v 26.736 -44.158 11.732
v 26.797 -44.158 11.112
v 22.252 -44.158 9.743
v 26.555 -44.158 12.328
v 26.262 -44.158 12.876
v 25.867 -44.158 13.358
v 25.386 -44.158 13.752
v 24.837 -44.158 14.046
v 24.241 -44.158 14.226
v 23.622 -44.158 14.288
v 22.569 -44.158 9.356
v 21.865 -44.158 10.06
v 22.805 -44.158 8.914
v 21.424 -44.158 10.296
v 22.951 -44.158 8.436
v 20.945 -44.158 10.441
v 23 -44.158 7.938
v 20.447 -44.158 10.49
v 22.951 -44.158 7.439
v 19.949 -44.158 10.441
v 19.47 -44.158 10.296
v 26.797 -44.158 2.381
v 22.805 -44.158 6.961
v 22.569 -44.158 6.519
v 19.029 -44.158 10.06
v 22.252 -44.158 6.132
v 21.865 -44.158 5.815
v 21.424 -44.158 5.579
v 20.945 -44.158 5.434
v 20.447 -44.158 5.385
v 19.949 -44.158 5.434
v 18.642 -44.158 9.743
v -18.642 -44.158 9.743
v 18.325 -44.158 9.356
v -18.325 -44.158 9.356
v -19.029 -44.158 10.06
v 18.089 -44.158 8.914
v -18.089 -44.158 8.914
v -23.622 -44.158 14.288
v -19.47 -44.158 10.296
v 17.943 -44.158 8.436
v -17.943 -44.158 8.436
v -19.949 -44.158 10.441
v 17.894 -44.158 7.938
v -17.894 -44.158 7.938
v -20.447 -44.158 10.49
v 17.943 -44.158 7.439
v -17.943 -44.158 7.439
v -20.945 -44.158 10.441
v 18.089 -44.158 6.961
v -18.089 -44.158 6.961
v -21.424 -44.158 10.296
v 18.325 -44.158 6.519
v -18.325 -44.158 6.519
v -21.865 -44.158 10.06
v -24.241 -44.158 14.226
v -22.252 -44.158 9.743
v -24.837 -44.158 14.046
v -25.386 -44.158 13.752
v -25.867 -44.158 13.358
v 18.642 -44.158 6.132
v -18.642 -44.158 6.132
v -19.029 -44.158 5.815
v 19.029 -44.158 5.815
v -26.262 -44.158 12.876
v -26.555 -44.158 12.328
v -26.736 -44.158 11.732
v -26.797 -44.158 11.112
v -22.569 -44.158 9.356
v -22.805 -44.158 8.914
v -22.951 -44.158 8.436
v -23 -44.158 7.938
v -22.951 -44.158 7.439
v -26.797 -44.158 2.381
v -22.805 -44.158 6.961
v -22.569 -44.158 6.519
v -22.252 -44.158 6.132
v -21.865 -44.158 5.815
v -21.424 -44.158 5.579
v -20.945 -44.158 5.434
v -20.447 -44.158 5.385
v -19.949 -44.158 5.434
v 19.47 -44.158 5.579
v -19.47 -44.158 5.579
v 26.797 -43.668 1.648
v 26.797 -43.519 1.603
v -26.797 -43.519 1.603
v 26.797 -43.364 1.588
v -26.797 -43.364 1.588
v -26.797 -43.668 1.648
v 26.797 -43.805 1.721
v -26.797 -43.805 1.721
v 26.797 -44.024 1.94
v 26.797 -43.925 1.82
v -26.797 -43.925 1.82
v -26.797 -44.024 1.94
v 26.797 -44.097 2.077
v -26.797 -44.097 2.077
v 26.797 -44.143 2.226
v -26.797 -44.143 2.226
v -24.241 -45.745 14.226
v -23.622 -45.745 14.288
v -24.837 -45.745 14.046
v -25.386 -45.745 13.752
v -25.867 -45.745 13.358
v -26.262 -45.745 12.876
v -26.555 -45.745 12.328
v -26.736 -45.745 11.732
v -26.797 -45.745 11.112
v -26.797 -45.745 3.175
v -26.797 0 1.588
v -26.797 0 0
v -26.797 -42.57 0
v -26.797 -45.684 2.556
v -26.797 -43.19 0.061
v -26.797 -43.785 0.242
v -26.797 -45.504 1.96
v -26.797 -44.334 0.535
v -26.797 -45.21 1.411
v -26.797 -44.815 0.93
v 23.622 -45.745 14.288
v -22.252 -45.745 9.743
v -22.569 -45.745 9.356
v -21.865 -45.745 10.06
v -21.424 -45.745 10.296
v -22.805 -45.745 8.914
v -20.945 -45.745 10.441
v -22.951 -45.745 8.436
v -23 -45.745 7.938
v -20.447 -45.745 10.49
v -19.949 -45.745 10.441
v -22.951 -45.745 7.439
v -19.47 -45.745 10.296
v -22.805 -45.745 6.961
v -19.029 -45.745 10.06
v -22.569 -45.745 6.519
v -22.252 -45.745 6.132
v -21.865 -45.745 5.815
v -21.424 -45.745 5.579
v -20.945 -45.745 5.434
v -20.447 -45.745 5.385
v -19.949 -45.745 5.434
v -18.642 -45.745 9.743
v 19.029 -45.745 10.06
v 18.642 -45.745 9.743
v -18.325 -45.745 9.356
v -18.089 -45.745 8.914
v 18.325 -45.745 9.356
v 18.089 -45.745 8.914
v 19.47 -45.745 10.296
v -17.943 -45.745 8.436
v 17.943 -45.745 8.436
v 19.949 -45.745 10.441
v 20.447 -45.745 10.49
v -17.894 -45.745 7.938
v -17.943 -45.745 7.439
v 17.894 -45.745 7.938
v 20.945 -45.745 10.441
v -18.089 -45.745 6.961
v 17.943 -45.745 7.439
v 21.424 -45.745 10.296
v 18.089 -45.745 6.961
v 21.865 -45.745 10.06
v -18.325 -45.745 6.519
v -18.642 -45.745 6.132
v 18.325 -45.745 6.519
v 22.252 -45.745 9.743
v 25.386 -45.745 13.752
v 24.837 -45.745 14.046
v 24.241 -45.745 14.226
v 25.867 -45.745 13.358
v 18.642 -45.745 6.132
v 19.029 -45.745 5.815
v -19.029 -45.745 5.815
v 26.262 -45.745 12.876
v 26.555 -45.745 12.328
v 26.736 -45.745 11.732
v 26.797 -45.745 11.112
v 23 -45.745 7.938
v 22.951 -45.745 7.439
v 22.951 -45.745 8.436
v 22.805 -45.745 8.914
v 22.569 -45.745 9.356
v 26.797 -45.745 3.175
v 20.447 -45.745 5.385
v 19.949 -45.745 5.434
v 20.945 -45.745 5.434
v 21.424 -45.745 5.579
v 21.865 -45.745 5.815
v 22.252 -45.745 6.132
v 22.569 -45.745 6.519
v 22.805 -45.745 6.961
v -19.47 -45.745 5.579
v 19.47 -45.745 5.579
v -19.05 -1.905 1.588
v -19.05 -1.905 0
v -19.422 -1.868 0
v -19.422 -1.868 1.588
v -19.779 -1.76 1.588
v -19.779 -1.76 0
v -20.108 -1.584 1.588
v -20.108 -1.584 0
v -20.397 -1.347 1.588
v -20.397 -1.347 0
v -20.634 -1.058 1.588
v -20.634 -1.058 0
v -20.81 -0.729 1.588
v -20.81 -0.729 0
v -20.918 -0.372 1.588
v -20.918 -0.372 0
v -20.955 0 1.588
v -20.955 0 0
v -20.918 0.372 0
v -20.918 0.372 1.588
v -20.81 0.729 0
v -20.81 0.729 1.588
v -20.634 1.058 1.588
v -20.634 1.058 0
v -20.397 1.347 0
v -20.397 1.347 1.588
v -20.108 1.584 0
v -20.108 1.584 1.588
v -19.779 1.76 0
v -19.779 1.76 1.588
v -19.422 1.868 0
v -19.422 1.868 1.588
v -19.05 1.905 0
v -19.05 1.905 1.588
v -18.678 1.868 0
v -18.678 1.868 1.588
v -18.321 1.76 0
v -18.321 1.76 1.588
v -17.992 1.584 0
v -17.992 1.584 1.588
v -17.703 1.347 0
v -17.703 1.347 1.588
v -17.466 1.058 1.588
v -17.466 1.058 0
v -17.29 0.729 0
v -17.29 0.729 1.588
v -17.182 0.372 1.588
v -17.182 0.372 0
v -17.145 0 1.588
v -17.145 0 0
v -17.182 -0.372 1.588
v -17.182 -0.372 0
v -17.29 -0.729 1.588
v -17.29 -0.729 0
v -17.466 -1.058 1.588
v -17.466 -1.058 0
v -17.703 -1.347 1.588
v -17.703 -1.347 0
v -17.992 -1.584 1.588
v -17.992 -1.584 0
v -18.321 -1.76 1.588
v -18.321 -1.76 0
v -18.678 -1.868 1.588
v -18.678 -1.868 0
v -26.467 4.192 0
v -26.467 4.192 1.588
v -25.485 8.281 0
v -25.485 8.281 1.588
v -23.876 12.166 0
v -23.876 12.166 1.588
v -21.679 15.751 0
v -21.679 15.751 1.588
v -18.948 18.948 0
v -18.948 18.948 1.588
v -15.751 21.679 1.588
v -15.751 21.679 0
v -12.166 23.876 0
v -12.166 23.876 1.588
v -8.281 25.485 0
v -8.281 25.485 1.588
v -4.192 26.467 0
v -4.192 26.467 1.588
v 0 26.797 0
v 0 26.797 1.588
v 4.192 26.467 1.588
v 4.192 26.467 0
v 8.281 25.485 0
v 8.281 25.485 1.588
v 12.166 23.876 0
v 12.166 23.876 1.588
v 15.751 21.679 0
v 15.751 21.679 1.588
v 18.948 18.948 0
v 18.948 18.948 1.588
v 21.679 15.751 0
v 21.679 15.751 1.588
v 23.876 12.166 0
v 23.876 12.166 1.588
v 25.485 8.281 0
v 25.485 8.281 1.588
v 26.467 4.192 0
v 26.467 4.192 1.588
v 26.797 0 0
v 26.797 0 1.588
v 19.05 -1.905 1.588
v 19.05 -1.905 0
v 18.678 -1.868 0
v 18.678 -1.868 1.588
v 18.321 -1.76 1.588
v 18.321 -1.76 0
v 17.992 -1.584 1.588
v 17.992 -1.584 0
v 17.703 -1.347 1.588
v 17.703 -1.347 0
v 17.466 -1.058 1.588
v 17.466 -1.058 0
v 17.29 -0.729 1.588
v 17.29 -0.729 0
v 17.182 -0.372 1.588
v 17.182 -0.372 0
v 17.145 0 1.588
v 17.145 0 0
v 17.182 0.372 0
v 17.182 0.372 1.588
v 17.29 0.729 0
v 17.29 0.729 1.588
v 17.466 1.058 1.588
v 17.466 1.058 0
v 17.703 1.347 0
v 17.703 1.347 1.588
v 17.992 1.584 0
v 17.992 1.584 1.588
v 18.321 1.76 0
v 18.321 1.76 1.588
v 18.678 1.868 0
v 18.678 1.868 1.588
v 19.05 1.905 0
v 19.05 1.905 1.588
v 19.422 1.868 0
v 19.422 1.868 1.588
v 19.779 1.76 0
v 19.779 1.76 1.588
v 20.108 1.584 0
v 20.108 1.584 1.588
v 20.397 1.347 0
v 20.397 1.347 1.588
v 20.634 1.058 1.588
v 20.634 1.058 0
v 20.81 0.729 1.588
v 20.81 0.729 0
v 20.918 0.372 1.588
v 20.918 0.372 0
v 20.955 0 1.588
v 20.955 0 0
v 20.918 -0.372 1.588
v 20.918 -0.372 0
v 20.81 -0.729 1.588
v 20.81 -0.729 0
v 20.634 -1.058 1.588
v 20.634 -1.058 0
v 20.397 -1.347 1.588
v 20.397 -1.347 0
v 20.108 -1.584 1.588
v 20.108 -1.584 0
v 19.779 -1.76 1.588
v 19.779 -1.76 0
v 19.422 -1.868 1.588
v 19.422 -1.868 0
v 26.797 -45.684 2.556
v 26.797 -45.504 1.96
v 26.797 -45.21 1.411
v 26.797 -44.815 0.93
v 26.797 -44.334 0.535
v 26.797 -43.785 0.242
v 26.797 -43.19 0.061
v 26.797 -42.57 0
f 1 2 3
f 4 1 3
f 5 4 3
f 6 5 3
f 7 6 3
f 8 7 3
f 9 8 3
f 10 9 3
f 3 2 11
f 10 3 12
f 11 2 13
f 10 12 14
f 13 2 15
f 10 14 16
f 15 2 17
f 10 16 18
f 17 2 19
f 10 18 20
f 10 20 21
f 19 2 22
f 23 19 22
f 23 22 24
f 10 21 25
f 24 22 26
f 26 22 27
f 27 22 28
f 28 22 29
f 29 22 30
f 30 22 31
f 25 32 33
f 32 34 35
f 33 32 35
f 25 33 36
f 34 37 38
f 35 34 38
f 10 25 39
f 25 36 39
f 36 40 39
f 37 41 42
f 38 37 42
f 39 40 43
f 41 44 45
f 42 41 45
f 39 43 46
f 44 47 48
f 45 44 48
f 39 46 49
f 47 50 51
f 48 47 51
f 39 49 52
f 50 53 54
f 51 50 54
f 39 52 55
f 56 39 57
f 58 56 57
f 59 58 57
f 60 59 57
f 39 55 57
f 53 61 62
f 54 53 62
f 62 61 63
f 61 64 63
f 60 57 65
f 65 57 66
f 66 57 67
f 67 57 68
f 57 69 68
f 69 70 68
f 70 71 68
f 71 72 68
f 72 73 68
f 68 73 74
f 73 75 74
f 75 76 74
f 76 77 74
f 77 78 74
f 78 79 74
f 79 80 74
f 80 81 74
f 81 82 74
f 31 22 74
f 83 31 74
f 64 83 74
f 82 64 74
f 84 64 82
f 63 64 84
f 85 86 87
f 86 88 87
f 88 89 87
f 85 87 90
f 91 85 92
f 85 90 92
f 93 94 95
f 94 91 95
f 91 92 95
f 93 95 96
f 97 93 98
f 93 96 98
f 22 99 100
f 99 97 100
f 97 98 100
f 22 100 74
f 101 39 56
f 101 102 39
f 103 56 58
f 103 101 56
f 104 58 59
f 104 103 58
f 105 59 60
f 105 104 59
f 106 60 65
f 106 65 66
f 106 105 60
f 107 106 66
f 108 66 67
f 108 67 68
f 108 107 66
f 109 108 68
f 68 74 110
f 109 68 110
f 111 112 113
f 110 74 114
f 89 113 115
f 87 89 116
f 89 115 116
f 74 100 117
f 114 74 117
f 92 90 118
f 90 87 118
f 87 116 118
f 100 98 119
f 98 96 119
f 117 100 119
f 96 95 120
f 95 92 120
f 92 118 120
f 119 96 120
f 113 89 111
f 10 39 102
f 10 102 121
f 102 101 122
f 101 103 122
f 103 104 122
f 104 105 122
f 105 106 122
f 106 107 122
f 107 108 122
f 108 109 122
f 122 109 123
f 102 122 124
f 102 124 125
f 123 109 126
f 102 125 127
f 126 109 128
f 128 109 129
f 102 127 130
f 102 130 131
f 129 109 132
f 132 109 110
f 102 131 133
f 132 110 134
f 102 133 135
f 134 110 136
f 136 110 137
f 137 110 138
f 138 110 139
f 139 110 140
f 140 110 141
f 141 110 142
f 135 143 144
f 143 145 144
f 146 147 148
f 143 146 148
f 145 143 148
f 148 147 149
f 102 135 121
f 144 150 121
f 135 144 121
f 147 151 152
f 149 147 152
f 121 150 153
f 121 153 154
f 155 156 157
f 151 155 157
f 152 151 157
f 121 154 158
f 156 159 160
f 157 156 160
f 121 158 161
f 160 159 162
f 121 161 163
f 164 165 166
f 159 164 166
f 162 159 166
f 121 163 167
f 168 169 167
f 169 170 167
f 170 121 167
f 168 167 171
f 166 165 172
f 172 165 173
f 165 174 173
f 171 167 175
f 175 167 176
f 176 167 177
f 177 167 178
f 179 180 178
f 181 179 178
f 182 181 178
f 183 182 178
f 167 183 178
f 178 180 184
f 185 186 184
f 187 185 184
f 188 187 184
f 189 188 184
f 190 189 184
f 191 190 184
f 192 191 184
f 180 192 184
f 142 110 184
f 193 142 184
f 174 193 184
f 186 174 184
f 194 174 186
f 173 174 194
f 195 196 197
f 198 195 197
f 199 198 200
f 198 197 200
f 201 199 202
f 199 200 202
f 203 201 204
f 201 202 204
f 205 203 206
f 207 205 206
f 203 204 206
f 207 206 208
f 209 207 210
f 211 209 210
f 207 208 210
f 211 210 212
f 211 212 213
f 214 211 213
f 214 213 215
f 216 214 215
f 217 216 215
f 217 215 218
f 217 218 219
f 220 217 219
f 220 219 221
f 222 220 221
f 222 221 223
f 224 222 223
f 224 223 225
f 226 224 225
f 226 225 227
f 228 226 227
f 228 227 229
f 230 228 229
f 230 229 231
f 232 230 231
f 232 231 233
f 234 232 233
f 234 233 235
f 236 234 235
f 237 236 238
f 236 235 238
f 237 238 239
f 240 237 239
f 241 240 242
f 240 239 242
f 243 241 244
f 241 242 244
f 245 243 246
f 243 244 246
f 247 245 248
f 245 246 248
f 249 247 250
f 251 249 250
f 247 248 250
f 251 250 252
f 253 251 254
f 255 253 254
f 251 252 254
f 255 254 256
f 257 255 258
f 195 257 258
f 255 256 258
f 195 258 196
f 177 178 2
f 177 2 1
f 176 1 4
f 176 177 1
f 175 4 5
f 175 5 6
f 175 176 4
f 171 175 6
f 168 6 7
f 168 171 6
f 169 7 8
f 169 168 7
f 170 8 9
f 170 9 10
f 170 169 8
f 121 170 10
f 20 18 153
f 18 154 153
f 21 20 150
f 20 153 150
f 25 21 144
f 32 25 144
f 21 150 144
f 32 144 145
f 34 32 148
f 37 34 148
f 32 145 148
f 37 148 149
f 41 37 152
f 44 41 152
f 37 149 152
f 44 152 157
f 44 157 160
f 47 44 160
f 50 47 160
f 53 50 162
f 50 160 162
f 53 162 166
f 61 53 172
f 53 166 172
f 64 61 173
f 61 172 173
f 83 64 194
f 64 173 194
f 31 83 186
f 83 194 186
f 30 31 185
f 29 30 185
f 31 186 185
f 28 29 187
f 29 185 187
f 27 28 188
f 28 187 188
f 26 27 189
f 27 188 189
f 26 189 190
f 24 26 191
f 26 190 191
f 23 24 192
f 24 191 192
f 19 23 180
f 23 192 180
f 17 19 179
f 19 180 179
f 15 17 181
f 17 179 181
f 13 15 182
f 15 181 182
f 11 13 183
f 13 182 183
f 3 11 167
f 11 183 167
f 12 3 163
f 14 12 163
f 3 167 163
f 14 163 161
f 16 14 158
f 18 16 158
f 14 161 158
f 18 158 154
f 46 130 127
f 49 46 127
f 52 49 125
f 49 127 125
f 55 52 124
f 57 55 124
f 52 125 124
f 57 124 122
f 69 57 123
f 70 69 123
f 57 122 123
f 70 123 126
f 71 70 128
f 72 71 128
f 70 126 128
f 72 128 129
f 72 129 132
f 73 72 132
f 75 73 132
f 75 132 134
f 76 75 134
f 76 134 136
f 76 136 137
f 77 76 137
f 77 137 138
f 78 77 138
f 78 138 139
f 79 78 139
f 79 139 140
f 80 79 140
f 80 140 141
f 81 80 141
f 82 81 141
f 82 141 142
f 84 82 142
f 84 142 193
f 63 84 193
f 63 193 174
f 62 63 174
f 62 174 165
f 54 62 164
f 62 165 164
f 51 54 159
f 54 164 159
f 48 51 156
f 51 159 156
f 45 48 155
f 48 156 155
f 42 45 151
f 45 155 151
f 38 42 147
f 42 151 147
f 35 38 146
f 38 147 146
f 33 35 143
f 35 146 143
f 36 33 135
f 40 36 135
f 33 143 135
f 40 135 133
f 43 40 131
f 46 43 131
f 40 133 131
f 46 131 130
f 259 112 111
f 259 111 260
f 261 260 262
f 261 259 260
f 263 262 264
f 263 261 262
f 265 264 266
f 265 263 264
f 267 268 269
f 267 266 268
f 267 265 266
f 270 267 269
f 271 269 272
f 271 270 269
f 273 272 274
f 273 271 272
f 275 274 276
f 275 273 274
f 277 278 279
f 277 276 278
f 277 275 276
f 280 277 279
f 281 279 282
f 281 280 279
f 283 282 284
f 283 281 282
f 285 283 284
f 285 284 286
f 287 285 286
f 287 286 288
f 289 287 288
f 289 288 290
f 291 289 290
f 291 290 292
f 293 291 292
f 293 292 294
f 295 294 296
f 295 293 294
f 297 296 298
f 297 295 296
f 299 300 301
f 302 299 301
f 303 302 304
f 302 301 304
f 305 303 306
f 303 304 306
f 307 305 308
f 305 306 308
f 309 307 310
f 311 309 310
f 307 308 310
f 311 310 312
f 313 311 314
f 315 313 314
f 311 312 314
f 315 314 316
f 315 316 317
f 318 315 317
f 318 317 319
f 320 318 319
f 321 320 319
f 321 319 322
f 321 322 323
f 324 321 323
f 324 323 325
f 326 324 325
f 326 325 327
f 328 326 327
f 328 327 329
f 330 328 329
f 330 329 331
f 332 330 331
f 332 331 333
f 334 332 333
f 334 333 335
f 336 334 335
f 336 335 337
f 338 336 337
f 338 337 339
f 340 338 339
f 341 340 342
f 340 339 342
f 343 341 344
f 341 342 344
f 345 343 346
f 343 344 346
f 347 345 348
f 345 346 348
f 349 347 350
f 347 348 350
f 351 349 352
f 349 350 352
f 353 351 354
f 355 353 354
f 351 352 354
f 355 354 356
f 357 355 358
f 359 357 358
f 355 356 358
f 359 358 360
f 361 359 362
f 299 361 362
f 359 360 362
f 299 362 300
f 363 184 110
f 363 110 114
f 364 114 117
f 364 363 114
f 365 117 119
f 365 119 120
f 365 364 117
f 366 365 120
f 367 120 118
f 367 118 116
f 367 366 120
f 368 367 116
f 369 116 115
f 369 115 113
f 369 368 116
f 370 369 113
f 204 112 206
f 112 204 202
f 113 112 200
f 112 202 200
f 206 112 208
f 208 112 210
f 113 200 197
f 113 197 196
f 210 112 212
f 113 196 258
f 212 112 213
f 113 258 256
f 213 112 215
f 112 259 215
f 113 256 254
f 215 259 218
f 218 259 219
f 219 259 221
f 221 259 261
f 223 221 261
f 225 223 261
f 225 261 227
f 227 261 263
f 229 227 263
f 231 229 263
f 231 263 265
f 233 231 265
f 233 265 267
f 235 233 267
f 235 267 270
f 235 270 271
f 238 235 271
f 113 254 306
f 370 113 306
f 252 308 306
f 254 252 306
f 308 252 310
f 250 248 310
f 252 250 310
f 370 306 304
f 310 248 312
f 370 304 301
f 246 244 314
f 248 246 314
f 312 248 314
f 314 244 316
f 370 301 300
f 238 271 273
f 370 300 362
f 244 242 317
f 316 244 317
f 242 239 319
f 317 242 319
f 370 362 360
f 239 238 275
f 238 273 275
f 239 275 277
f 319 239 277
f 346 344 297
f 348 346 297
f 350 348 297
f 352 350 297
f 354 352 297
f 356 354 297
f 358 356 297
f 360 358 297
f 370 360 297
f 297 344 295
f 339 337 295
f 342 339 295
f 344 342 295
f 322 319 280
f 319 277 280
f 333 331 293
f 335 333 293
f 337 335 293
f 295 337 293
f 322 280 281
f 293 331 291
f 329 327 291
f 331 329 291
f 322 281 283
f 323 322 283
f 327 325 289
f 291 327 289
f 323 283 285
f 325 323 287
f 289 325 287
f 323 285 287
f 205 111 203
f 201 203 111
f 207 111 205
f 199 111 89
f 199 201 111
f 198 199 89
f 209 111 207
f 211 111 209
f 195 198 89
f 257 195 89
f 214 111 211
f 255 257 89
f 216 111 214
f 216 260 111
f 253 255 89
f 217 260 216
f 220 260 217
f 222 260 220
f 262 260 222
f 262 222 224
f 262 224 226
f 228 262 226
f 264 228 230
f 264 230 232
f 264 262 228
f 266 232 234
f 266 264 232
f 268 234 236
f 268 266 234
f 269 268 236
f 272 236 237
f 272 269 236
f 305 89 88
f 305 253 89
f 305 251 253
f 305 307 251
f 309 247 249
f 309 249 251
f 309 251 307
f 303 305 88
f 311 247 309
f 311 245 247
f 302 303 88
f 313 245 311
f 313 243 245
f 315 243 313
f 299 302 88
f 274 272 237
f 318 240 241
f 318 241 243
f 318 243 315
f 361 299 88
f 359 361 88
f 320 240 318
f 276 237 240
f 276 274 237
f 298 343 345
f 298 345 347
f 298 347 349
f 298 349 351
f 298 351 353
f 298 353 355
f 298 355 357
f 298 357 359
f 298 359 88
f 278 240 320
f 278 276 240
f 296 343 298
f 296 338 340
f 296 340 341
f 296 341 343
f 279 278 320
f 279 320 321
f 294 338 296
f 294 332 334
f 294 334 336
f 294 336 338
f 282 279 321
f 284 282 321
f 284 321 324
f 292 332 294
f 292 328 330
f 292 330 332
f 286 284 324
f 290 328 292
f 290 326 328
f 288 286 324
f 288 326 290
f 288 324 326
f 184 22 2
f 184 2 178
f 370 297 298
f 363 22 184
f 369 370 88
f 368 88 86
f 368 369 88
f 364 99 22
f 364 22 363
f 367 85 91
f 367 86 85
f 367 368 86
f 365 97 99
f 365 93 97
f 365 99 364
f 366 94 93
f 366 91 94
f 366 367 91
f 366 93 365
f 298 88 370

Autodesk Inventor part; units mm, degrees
ref_plane "YZ Plane" through (0, 0, 0) normal (1, 0, 0) x (0, 1, 0)
ref_plane "XZ Plane" through (0, 0, 0) normal (0, 1, 0) x (-1, 0, 0)
ref_plane "XY Plane" through (0, 0, 0) normal (0, 0, 1) x (1, 0, 0)
sketch "Sketch1" plane through (0, 0, 0) normal (0, 0, 1) x (1, 0, 0)
  circle A0 centre (0, 0) radius 26.797 projected
  line L0 (-26.797, -45.7454) -> (26.797, -45.7454)
  line L1 (-26.797, 0) -> (-26.797, -45.7454)
  line L2 (26.797, 0) -> (26.797, -45.7454)
  line L3 (-26.797, -45.7454) -> (26.797, -45.7454) projected
  point P0 (0, 0)
extrude "Extrusion1" add sketch "Sketch1" along normal blind 1.5875
sketch "Sketch2" plane through (0, 0, 1.5875) normal (0, 0, 1) x (1, 0, 0)
  line L0 (26.797, 0) -> (26.797, -45.7454) projected
  line L1 (-26.797, -45.7454) -> (26.797, -45.7454)
  line L2 (26.797, -45.7454) -> (26.797, -44.1579)
  line L3 (26.797, -44.1579) -> (-26.797, -44.1579)
  line L4 (-26.797, -44.1579) -> (-26.797, -45.7454)
  dimension "d2" = 1.5875
extrude "Extrusion2" add sketch "Sketch2" along normal blind 12.7
fillet "Fillet1" radius 3.175 2 edges at (-26.797, -44.9517, 14.2875) (26.797, -44.9517, 14.2875)
hole "Hole1" at (-20.447, -44.1579, 7.9375) direction (0, -1, 0) diameter 5.1054 end through all clearance for "Flat Head Machine Screw (82)" size "#10" standard "Ansi Unified Screw Threads"
fillet "Fillet2" radius 0.7937 1 edges at (0, -44.1579, 1.5875)
hole "Hole2" at (20.447, -44.1579, 7.9375) direction (0, -1, 0) diameter 5.1054 end through all clearance for "Flat Head Machine Screw (82)" size "#10" standard "Ansi Unified Screw Threads"
sketch "Sketch3" plane through (0, 0, 1.5875) normal (0, 0, 1) x (1, 0, 0)
  arc A0 (26.797, 0) -> (-26.797, 0) centre (0, 0) ccw projected
  point P0 (-19.05, 0)
  point P1 (19.05, 0)
  dimension "d26" = 19.05
  dimension "d27" = 19.05
hole "Hole3" at (-19.05, 0, 1.5875) at (19.05, 0, 1.5875) direction (0, 0, -1) diameter 3.81 end through all clearance for "Flat Head Machine Screw (82)" size "#6" standard "Ansi Unified Screw Threads"
fillet "Fillet3" radius 3.175 1 edges at (0, -45.7454, 0)
equation "\"d27\" = d26"
properties part number "Pneumatics_VIAIR_00090_02"
